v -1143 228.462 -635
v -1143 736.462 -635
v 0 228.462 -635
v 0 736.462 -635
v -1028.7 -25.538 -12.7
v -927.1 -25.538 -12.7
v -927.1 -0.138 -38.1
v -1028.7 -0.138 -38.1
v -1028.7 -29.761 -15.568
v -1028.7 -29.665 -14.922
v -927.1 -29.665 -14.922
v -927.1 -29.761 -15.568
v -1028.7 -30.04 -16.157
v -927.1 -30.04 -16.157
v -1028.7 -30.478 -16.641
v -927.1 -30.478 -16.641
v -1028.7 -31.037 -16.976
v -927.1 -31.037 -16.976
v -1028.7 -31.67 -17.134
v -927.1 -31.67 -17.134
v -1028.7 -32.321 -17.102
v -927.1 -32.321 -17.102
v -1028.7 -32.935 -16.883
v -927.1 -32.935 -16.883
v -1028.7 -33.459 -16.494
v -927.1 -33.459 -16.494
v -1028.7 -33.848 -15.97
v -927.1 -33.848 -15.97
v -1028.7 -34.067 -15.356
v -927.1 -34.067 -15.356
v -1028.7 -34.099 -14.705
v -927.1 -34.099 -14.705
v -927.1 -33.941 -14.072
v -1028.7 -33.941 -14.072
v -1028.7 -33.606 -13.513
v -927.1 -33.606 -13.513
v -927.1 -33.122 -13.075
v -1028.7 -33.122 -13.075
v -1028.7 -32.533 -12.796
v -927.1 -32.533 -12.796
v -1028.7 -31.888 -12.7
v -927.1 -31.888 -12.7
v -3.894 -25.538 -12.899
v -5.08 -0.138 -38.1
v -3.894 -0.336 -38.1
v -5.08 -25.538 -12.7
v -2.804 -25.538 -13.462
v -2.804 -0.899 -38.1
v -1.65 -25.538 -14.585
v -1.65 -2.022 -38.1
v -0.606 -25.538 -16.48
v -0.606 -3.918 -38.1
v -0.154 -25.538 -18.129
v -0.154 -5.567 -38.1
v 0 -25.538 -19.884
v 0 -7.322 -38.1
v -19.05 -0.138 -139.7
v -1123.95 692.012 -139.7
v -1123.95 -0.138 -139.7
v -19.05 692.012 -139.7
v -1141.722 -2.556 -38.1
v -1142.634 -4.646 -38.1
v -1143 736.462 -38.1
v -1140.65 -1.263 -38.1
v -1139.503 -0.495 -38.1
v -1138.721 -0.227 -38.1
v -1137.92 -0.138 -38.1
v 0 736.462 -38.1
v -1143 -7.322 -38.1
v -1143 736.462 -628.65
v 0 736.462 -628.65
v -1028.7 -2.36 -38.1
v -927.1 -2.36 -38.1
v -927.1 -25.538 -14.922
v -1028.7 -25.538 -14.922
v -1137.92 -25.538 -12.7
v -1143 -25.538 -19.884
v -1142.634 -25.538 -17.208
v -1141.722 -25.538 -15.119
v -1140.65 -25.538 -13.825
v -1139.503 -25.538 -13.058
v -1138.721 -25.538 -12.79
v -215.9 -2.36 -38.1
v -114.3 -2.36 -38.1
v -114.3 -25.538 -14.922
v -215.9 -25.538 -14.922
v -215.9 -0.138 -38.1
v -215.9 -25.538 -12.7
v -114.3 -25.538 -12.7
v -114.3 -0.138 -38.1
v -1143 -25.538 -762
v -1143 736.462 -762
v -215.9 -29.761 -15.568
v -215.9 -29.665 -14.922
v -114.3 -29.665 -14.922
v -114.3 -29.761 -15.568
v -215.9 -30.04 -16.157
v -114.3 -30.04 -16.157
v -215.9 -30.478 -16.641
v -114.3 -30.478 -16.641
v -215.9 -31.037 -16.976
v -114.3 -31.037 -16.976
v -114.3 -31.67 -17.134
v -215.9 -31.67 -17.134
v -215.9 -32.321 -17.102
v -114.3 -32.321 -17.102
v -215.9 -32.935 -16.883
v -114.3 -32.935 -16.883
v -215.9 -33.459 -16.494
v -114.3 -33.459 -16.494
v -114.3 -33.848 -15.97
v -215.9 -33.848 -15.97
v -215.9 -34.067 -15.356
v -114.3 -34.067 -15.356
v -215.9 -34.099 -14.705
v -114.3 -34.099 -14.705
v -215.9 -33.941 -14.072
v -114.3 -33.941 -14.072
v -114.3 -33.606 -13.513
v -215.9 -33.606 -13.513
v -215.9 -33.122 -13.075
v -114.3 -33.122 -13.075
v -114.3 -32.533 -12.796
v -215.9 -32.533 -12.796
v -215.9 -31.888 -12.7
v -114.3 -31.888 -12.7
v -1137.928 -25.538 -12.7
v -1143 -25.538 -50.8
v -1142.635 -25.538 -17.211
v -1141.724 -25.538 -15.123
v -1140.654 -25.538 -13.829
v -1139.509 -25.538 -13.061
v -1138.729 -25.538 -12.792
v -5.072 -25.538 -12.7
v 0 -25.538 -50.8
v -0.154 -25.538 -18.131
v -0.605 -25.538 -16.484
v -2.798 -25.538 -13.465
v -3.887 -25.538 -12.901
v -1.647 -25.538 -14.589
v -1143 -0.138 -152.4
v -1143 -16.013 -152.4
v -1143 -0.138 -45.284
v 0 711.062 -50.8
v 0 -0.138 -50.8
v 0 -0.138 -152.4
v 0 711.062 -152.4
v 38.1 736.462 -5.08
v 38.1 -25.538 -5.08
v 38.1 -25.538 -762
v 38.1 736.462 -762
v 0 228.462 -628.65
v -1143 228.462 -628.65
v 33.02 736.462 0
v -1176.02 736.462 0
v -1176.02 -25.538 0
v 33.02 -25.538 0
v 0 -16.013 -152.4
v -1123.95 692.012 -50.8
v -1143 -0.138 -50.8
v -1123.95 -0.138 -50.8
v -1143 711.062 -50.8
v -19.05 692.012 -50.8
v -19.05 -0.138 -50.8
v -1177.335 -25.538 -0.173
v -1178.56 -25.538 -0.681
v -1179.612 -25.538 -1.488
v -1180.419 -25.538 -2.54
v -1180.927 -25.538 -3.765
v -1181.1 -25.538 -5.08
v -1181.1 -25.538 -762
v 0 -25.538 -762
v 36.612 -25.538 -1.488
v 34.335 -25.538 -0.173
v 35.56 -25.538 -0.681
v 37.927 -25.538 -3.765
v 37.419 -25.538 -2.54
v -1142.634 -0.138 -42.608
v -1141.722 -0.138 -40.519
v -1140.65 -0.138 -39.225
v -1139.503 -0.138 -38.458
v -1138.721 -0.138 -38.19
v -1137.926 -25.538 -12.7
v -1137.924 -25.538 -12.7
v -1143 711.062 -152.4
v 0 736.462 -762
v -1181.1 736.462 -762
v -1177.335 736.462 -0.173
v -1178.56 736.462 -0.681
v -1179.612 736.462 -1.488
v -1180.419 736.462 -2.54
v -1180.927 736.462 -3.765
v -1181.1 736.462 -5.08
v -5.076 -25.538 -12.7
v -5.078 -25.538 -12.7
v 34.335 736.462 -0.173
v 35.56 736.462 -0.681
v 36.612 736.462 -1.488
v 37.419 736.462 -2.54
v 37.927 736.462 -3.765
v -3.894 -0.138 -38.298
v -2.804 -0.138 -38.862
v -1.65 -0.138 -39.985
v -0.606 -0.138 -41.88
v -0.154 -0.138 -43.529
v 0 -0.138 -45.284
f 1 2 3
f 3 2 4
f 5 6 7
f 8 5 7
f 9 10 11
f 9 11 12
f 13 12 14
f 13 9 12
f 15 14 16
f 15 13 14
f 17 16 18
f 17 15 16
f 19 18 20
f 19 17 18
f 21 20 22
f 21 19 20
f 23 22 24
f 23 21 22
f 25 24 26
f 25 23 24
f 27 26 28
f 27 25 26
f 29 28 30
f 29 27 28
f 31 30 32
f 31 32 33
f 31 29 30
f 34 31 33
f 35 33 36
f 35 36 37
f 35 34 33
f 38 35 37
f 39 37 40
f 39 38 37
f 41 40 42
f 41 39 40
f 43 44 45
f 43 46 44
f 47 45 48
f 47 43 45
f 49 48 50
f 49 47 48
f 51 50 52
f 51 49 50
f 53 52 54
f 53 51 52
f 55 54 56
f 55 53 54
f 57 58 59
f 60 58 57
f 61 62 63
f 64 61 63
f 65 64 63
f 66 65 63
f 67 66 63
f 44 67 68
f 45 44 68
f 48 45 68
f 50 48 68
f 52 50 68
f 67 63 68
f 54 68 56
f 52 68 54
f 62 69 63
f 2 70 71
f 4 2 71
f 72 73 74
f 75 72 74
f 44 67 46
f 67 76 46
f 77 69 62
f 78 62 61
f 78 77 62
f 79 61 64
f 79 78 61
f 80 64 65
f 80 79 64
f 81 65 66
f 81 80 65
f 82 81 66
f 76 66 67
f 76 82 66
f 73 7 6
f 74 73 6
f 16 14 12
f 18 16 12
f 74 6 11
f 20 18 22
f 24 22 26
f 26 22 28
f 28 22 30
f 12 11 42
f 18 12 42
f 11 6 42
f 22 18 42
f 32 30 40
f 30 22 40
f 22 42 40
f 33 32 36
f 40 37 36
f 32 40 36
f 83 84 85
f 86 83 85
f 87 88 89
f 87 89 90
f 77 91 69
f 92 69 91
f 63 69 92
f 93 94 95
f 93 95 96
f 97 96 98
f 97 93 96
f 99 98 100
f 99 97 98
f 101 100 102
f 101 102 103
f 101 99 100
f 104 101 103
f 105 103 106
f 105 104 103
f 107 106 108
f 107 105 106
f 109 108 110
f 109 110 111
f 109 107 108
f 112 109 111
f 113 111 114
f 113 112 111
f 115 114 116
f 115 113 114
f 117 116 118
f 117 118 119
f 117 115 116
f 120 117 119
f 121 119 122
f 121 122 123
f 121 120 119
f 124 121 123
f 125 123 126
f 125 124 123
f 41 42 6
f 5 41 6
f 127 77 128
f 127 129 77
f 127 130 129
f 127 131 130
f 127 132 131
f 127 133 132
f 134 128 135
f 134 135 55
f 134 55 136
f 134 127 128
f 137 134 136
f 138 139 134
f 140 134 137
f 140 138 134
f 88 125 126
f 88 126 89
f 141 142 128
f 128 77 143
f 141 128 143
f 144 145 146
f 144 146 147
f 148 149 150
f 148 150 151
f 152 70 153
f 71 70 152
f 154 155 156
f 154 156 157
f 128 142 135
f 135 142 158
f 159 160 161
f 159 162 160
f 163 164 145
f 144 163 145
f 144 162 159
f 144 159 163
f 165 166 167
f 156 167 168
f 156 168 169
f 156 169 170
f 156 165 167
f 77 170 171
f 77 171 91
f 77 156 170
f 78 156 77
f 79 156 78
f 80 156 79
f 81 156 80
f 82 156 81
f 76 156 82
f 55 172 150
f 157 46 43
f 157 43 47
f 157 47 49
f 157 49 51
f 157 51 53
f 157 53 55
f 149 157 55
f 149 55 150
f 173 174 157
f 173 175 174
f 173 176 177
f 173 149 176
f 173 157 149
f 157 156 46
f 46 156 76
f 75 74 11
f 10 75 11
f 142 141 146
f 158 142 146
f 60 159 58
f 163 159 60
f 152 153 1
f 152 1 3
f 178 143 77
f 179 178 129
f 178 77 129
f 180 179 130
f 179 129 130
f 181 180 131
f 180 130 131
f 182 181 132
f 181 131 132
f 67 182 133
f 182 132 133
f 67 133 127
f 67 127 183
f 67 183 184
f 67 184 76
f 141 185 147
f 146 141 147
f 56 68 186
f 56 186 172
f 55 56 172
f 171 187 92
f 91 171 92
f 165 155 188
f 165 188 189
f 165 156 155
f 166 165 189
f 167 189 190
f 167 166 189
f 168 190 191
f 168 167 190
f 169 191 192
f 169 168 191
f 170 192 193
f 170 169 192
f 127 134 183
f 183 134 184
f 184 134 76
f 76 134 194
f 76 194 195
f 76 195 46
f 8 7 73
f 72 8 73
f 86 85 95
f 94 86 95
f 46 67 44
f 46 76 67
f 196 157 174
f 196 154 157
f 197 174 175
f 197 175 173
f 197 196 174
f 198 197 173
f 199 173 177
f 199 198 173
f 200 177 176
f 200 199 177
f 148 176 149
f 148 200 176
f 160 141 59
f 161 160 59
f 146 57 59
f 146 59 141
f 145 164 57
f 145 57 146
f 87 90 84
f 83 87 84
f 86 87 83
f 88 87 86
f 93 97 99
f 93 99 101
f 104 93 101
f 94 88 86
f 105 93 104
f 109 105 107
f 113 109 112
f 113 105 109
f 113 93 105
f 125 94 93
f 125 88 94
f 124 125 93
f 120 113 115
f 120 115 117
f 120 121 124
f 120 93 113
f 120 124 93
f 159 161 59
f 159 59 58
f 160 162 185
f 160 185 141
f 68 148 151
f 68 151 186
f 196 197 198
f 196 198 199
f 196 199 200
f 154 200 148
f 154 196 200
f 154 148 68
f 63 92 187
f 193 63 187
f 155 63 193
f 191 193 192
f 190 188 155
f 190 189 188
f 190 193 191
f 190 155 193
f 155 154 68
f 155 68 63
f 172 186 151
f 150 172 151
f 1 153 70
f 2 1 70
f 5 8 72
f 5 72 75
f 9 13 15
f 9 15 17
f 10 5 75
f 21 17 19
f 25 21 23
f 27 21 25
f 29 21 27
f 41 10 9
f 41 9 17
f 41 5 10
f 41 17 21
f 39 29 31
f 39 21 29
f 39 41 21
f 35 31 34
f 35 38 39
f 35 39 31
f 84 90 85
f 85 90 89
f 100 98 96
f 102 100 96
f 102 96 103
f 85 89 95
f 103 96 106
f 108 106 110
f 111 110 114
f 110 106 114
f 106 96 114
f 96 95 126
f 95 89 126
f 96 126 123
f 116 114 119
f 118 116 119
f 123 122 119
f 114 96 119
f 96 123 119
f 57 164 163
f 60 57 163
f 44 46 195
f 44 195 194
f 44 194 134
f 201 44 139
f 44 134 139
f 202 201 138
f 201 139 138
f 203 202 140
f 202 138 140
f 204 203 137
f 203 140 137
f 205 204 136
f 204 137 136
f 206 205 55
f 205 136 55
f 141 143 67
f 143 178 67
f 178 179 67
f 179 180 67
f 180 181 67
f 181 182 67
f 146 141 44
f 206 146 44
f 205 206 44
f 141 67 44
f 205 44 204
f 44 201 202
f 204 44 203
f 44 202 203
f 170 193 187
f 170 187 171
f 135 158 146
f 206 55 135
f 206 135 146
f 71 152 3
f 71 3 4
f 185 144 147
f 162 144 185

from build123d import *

# Parameters (mm, degrees)
F0_W      = 1143
F0_H      = 25.4
F0_H_2    = 228.6
F0_H_3    = 508
F1_DEPTH  = 38.1
F2_DEPTH  = 762
F3_SIZE   = 25.4
F4_R      = 5.08
F5_START  = -12.7
F5_DEPTH  = 139.7
F6_SIZE   = 25.39999
F7_R      = 5.08
F8_START  = -628.65
F8_DEPTH  = 6.35
F10_START = -152.4
F10_DEPTH = 101.6
F11_START = -965.2
F11_DEPTH = 101.6
F12_R     = 5.08
F13_R     = 5.08
F15_START = -50.8
F14_W     = 19.05
F14_H     = 692.15
F14_W_2   = 1104.9
F14_H_2   = 19.05
F15_DEPTH = 101.6
F16_START = -139.7
F16_DEPTH = 12.7
F17_SIZE2 = 9.525
F17_SIZE  = 101.6


# Not quite as in the source:
# - a fillet or chamfer is up to 0.001 mm smaller than in the source, because OpenCascade refuses the exact size


with BuildPart() as f1:
    # F0 (on Top) → F1 (new body)
    with BuildSketch(Plane.XY):
        with Locations((-571.5, -12.8375131965)):
            Rectangle(F0_W, F0_H)
        with Locations((-571.5, 114.1624868035)):
            Rectangle(F0_W, F0_H_2)
        with Locations((-571.5, 482.4624868035)):
            Rectangle(F0_W, F0_H_3)
    extrude(amount=-F1_DEPTH)

    # F0 (on Top) → F2 (join)
    with BuildSketch(Plane.XY):
        Polygon((-1143, 736.4624868035), (-1181.1, 736.4624868035), (-1181.1, -25.5375131965), (-1143, -25.5375131965), (-1143, -0.1375131965), (-1143, 228.4624868035), align=None)
        Polygon((38.1, 736.4624868035), (0, 736.4624868035), (0, 228.4624868035), (0, -0.1375131965), (0, -25.5375131965), (38.1, -25.5375131965), align=None)
    extrude(amount=-F2_DEPTH)

    # F3
    f3_edges = [f1.edges().sort_by_distance(p)[0] for p in [
        (-571.5, -25.537513, -38.1),
    ]]
    chamfer(f3_edges, length=F3_SIZE)

    # F4
    f4_edges = [f1.edges().sort_by_distance(p)[0] for p in [
        (-1143, -12.837513, -25.4),
        (0, -12.837513, -25.4),
    ]]
    fillet(f4_edges, radius=F4_R)

    # F12
    f12_edges = [f1.edges().sort_by_distance(p)[0] for p in [
        (-1181.1, 355.462487, 0),
    ]]
    fillet(f12_edges, radius=F12_R)

    # F13
    f13_edges = [f1.edges().sort_by_distance(p)[0] for p in [
        (38.1, 355.462487, 0),
    ]]
    fillet(f13_edges, radius=F13_R)


with BuildPart() as f5:
    # F0 (on Top) → F5 (new body)
    with BuildSketch(Plane.XY.offset(F5_START)):
        with Locations((-571.5, -12.8375131965)):
            Rectangle(F0_W, F0_H)
    extrude(amount=-F5_DEPTH)

    # F6 (size 25.4 in the source; OpenCascade refuses exactly that, so slightly less here)
    f6_edges = [f5.edges().sort_by_distance(p)[0] for p in [
        (-571.5, -0.137513, -12.7),
    ]]
    chamfer(f6_edges, length=F6_SIZE)

    # F7
    f7_edges = [f5.edges().sort_by_distance(p)[0] for p in [
        (-1143, -12.837508, -25.399995),
        (0, -12.837508, -25.399995),
    ]]
    fillet(f7_edges, radius=F7_R)

    # F17
    f17_edges = [f5.edges().sort_by_distance(p)[0] for p in [
        (-571.5, -25.537513, -152.4),
    ]]
    f17_side = f5.faces().sort_by_distance((-571.5, -25.537513, -82.556695))[0]
    chamfer(f17_edges, length=F17_SIZE, length2=F17_SIZE2, reference=f17_side)


with BuildPart() as f8:
    # F0 (on Top) → F8 (new body)
    with BuildSketch(Plane.XY.offset(F8_START)):
        with Locations((-571.5, 482.4624868035)):
            Rectangle(F0_W, F0_H_3)
    extrude(amount=-F8_DEPTH)


with BuildPart() as f10:
    # F9 (on face) → F10 (new body)
    with BuildSketch(Plane(origin=(-1181.1, 0, 0), x_dir=(0, -1, 0), z_dir=(-1, 0, 0)).offset(F10_START)):
        with BuildLine():
            ThreePointArc((29.6650131965, -14.9225), (33.4590580177, -16.4940448212), (31.8875131965, -12.7))
            Line((31.8875131965, -12.7), (31.8875131965, -14.9225))
            Line((31.8875131965, -14.9225), (29.6650131965, -14.9225))
        make_face()
        Polygon((31.8875131965, -12.7), (25.5375131965, -12.7), (25.5375131965, -14.9225), (29.6650131965, -14.9225), (31.8875131965, -14.9225), align=None)
        Polygon((25.5375131965, -14.9225), (23.3150131965, -14.9225), (0.1375131965, -38.1), (2.3600131965, -38.1), align=None)
        Polygon((25.5375131965, -14.9225), (25.5375131965, -12.7), (23.3150131965, -14.9225), align=None)
    extrude(amount=-F10_DEPTH)


with BuildPart() as f11:
    # F9 (on face) → F11 (new body)
    with BuildSketch(Plane(origin=(-1181.1, 0, 0), x_dir=(0, -1, 0), z_dir=(-1, 0, 0)).offset(F11_START)):
        Polygon((31.8875131965, -12.7), (25.5375131965, -12.7), (25.5375131965, -14.9225), (29.6650131965, -14.9225), (31.8875131965, -14.9225), align=None)
        with BuildLine():
            ThreePointArc((29.6650131965, -14.9225), (33.4590580177, -16.4940448212), (31.8875131965, -12.7))
            Line((31.8875131965, -12.7), (31.8875131965, -14.9225))
            Line((31.8875131965, -14.9225), (29.6650131965, -14.9225))
        make_face()
        Polygon((25.5375131965, -14.9225), (23.3150131965, -14.9225), (0.1375131965, -38.1), (2.3600131965, -38.1), align=None)
        Polygon((25.5375131965, -14.9225), (25.5375131965, -12.7), (23.3150131965, -14.9225), align=None)
    extrude(amount=-F11_DEPTH)


with BuildPart() as f15:
    # F14 (on face) → F15 (new body)
    with BuildSketch(Plane.XY.offset(F15_START)):
        with Locations((-1133.475, 345.9374868035)):
            Rectangle(F14_W, F14_H)
        with Locations((-9.525, 345.9374868035)):
            Rectangle(F14_W, F14_H)
        with Locations((-571.5, 701.5374868035)):
            Rectangle(F14_W_2, F14_H_2)
        with Locations((-9.525, 701.5374868035)):
            Rectangle(F14_W, F14_H_2)
        with Locations((-1133.475, 701.5374868035)):
            Rectangle(F14_W, F14_H_2)
    extrude(amount=-F15_DEPTH)

    # F14 (on face) → F16 (join)
    with BuildSketch(Plane.XY.offset(F16_START)):
        with Locations((-571.5, 345.9374868035)):
            Rectangle(F14_W_2, F14_H)
    extrude(amount=-F16_DEPTH)


solid = Compound([f1.part, f5.part, f8.part, f10.part, f11.part, f15.part])
